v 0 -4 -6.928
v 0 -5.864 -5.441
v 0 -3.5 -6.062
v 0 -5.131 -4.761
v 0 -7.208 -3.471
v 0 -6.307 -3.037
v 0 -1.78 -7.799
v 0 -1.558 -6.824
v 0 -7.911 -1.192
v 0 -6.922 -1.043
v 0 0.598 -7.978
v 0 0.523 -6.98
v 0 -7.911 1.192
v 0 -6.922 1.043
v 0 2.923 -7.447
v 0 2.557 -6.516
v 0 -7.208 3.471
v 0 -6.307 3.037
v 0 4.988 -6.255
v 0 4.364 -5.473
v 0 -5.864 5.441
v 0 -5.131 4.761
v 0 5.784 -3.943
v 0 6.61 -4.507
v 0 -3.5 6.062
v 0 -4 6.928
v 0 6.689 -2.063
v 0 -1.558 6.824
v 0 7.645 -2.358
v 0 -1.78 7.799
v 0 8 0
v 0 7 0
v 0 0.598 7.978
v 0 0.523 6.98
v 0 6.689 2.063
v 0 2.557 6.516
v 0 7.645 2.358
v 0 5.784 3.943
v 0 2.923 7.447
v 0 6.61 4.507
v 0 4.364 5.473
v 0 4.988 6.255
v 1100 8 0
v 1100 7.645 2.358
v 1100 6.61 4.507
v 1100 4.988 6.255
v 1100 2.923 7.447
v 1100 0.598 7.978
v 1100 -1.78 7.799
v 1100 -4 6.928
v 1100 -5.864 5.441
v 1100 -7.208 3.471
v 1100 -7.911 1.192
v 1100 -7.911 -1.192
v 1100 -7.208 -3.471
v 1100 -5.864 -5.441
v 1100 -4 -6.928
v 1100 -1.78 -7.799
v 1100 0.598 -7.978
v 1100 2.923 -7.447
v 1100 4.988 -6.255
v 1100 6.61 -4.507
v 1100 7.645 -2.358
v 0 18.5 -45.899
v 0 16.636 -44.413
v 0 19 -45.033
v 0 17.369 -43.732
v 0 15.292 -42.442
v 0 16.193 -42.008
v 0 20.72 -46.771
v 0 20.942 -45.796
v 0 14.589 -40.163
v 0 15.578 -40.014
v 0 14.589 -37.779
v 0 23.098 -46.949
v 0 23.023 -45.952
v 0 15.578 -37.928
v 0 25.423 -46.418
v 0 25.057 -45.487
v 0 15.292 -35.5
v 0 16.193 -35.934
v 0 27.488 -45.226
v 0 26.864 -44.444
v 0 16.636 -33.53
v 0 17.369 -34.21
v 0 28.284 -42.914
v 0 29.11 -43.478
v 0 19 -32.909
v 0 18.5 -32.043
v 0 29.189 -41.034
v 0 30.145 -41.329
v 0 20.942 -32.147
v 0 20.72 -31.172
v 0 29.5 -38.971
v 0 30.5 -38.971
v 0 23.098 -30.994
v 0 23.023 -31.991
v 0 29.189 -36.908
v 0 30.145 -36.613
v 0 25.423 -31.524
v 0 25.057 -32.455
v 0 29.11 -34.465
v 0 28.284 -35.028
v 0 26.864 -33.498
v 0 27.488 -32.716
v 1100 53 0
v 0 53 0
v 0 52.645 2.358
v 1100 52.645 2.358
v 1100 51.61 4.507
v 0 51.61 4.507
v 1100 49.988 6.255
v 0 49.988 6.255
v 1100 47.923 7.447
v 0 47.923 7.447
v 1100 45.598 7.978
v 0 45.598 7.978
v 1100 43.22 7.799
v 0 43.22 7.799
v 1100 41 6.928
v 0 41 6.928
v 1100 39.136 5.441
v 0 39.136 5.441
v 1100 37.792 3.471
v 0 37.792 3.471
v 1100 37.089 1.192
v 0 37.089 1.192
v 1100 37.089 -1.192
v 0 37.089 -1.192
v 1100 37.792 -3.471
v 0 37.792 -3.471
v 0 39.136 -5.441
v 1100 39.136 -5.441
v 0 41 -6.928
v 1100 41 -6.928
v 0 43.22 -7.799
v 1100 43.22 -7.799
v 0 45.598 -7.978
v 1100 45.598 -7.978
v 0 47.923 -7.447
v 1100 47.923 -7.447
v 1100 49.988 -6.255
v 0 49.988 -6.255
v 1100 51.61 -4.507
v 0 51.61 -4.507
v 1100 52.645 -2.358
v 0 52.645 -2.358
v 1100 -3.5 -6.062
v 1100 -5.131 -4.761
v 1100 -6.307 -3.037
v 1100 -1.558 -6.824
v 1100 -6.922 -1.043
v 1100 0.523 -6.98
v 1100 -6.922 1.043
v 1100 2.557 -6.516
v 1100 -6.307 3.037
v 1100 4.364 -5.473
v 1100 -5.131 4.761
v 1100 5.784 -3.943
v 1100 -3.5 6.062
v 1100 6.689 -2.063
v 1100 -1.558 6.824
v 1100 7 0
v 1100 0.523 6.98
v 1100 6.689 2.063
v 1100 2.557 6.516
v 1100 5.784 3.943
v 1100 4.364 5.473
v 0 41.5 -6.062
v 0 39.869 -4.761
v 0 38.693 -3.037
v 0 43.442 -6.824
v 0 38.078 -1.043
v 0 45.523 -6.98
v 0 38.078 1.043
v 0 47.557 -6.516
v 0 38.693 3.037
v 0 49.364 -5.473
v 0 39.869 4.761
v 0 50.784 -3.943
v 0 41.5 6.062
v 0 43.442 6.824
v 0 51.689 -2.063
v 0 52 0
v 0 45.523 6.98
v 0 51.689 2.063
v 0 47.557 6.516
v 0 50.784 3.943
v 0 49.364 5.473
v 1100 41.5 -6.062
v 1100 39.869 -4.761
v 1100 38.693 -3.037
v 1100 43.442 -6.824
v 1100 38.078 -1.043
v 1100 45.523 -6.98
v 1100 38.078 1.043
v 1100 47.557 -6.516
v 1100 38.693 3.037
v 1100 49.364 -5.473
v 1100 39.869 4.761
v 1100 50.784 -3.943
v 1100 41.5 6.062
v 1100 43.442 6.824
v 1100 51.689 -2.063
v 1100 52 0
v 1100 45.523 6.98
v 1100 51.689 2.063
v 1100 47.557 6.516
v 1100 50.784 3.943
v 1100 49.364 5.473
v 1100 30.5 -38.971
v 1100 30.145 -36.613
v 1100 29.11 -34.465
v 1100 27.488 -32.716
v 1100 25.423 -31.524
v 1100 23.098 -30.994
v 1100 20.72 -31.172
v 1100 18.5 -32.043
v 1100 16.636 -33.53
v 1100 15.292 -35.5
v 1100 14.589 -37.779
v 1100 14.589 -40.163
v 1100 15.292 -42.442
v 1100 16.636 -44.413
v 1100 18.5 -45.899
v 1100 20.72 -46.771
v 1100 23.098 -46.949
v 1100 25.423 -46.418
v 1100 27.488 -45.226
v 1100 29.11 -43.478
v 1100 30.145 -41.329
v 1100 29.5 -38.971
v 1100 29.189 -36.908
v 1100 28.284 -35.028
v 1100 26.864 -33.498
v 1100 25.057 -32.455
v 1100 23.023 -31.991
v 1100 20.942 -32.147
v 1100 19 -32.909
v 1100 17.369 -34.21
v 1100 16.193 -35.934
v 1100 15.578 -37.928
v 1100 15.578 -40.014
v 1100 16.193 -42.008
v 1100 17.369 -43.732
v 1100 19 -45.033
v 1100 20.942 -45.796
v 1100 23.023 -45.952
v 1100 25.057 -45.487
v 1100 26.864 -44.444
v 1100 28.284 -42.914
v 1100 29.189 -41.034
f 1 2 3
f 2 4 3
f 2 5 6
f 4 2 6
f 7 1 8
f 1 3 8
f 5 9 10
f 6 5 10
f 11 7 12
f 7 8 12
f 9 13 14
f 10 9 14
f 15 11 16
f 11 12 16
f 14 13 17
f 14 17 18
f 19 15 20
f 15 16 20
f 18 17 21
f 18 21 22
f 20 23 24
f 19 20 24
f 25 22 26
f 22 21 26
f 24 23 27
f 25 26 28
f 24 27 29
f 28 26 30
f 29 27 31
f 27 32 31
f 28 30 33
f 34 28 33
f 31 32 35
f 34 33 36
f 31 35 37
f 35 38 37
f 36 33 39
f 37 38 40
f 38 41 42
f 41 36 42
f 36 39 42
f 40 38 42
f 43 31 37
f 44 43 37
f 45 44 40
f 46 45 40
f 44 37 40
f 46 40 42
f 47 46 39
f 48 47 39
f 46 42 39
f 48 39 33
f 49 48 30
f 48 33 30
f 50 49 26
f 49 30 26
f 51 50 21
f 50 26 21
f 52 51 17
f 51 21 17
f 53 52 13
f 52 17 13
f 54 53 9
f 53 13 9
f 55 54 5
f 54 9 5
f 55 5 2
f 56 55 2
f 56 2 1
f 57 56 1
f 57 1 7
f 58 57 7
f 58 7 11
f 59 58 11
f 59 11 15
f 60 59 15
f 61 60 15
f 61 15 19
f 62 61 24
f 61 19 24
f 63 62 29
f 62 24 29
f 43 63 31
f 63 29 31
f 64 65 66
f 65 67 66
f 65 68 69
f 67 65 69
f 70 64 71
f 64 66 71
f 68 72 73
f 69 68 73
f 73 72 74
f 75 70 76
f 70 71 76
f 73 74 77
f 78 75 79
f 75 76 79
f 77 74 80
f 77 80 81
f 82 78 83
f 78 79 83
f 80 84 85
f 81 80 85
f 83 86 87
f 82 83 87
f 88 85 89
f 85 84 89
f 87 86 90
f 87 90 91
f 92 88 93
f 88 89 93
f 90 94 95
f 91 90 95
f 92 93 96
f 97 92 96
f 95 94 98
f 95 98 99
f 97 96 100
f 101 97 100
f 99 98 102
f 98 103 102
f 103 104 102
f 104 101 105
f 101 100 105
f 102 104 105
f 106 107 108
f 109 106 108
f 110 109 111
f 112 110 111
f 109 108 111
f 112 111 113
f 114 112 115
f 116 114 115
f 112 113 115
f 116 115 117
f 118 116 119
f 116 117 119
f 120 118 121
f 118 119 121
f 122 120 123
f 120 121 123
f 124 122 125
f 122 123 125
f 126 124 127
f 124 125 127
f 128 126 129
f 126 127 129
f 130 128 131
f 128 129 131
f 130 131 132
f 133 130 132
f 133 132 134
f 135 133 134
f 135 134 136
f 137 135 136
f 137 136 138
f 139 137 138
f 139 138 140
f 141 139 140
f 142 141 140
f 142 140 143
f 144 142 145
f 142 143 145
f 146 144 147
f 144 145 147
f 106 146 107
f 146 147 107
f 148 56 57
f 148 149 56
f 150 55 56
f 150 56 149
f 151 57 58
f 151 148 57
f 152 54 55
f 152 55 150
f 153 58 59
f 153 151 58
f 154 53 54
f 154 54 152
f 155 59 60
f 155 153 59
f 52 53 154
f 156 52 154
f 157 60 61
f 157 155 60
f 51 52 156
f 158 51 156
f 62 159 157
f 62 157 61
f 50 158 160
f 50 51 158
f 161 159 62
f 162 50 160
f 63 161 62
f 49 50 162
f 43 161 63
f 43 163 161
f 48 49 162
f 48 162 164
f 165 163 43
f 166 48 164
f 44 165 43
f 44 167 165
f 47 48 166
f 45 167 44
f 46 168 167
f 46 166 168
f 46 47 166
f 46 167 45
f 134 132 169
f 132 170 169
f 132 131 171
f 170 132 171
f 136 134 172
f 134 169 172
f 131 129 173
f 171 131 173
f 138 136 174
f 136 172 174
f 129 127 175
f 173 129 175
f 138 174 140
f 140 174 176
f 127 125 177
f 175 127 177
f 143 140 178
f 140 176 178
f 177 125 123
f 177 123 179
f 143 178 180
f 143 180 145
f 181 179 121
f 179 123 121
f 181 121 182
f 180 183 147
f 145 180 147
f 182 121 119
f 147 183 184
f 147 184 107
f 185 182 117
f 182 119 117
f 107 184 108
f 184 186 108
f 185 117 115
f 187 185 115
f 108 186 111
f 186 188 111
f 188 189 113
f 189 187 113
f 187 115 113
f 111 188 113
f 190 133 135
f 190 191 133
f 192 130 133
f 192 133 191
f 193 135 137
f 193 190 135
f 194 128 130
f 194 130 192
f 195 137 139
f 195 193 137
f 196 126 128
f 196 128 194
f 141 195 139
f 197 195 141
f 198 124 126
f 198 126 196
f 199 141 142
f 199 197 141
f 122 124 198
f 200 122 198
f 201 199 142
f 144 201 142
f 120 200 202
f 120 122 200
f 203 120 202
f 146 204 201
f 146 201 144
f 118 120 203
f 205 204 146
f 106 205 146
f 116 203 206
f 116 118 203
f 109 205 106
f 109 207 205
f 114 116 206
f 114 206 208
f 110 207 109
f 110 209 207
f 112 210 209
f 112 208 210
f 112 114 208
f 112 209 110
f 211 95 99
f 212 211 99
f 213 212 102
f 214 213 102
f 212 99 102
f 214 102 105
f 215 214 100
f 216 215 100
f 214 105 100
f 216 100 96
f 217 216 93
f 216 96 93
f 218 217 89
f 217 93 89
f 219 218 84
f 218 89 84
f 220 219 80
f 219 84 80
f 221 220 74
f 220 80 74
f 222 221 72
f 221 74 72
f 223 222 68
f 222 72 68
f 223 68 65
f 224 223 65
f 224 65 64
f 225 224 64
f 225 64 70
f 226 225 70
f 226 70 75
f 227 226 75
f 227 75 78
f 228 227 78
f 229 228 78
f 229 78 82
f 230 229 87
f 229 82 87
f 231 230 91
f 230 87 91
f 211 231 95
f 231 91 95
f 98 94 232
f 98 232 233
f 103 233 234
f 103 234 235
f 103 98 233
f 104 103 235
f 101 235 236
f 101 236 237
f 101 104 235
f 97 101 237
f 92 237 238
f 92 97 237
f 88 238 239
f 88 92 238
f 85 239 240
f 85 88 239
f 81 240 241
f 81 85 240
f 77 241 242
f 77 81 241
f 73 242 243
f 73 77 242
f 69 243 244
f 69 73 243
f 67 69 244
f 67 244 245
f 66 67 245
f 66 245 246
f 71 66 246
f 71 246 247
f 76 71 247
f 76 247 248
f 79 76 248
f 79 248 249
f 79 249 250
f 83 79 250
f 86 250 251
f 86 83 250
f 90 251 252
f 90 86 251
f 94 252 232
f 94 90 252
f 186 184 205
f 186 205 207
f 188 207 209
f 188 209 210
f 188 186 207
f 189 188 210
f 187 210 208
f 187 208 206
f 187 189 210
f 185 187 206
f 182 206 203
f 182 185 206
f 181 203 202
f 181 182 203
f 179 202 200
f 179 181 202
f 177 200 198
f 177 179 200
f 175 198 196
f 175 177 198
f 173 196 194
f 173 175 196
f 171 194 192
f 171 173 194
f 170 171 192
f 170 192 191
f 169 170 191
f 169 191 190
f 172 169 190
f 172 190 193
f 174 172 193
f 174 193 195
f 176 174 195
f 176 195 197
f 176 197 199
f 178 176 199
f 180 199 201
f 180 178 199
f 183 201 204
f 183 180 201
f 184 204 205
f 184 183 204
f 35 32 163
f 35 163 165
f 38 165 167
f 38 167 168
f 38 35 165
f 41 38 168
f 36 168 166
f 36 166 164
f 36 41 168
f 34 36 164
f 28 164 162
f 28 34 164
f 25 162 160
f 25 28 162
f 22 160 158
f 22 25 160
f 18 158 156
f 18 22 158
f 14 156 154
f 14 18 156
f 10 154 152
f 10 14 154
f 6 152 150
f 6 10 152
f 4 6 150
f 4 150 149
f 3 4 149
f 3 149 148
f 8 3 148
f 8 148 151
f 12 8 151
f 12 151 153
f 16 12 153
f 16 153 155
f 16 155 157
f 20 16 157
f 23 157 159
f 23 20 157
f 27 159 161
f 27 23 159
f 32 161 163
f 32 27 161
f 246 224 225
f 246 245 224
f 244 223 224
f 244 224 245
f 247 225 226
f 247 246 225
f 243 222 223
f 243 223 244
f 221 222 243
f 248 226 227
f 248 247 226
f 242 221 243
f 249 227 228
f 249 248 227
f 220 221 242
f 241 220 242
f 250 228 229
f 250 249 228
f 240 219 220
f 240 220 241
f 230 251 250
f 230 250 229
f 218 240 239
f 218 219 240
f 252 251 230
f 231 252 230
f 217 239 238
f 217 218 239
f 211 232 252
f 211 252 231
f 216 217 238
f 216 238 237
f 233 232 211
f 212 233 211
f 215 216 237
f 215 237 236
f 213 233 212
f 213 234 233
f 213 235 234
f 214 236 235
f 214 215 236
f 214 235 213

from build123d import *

# Parameters (mm, degrees)
F0_R     = 8
F0_R_2   = 7
F1_DEPTH = 1100


with BuildPart() as f1:
    # F0 (on Right) → F1 (new body)
    with BuildSketch(Plane.YZ):
        Circle(F0_R)
        Circle(F0_R_2, mode=Mode.SUBTRACT)
        with Locations((45, 0)):
            Circle(F0_R)
        with Locations((45, 0)):
            Circle(F0_R_2, mode=Mode.SUBTRACT)
        with Locations((22.5, -38.971143)):
            Circle(F0_R)
        with Locations((22.5, -38.971143)):
            Circle(F0_R_2, mode=Mode.SUBTRACT)
    extrude(amount=F1_DEPTH)


solid = f1.part
